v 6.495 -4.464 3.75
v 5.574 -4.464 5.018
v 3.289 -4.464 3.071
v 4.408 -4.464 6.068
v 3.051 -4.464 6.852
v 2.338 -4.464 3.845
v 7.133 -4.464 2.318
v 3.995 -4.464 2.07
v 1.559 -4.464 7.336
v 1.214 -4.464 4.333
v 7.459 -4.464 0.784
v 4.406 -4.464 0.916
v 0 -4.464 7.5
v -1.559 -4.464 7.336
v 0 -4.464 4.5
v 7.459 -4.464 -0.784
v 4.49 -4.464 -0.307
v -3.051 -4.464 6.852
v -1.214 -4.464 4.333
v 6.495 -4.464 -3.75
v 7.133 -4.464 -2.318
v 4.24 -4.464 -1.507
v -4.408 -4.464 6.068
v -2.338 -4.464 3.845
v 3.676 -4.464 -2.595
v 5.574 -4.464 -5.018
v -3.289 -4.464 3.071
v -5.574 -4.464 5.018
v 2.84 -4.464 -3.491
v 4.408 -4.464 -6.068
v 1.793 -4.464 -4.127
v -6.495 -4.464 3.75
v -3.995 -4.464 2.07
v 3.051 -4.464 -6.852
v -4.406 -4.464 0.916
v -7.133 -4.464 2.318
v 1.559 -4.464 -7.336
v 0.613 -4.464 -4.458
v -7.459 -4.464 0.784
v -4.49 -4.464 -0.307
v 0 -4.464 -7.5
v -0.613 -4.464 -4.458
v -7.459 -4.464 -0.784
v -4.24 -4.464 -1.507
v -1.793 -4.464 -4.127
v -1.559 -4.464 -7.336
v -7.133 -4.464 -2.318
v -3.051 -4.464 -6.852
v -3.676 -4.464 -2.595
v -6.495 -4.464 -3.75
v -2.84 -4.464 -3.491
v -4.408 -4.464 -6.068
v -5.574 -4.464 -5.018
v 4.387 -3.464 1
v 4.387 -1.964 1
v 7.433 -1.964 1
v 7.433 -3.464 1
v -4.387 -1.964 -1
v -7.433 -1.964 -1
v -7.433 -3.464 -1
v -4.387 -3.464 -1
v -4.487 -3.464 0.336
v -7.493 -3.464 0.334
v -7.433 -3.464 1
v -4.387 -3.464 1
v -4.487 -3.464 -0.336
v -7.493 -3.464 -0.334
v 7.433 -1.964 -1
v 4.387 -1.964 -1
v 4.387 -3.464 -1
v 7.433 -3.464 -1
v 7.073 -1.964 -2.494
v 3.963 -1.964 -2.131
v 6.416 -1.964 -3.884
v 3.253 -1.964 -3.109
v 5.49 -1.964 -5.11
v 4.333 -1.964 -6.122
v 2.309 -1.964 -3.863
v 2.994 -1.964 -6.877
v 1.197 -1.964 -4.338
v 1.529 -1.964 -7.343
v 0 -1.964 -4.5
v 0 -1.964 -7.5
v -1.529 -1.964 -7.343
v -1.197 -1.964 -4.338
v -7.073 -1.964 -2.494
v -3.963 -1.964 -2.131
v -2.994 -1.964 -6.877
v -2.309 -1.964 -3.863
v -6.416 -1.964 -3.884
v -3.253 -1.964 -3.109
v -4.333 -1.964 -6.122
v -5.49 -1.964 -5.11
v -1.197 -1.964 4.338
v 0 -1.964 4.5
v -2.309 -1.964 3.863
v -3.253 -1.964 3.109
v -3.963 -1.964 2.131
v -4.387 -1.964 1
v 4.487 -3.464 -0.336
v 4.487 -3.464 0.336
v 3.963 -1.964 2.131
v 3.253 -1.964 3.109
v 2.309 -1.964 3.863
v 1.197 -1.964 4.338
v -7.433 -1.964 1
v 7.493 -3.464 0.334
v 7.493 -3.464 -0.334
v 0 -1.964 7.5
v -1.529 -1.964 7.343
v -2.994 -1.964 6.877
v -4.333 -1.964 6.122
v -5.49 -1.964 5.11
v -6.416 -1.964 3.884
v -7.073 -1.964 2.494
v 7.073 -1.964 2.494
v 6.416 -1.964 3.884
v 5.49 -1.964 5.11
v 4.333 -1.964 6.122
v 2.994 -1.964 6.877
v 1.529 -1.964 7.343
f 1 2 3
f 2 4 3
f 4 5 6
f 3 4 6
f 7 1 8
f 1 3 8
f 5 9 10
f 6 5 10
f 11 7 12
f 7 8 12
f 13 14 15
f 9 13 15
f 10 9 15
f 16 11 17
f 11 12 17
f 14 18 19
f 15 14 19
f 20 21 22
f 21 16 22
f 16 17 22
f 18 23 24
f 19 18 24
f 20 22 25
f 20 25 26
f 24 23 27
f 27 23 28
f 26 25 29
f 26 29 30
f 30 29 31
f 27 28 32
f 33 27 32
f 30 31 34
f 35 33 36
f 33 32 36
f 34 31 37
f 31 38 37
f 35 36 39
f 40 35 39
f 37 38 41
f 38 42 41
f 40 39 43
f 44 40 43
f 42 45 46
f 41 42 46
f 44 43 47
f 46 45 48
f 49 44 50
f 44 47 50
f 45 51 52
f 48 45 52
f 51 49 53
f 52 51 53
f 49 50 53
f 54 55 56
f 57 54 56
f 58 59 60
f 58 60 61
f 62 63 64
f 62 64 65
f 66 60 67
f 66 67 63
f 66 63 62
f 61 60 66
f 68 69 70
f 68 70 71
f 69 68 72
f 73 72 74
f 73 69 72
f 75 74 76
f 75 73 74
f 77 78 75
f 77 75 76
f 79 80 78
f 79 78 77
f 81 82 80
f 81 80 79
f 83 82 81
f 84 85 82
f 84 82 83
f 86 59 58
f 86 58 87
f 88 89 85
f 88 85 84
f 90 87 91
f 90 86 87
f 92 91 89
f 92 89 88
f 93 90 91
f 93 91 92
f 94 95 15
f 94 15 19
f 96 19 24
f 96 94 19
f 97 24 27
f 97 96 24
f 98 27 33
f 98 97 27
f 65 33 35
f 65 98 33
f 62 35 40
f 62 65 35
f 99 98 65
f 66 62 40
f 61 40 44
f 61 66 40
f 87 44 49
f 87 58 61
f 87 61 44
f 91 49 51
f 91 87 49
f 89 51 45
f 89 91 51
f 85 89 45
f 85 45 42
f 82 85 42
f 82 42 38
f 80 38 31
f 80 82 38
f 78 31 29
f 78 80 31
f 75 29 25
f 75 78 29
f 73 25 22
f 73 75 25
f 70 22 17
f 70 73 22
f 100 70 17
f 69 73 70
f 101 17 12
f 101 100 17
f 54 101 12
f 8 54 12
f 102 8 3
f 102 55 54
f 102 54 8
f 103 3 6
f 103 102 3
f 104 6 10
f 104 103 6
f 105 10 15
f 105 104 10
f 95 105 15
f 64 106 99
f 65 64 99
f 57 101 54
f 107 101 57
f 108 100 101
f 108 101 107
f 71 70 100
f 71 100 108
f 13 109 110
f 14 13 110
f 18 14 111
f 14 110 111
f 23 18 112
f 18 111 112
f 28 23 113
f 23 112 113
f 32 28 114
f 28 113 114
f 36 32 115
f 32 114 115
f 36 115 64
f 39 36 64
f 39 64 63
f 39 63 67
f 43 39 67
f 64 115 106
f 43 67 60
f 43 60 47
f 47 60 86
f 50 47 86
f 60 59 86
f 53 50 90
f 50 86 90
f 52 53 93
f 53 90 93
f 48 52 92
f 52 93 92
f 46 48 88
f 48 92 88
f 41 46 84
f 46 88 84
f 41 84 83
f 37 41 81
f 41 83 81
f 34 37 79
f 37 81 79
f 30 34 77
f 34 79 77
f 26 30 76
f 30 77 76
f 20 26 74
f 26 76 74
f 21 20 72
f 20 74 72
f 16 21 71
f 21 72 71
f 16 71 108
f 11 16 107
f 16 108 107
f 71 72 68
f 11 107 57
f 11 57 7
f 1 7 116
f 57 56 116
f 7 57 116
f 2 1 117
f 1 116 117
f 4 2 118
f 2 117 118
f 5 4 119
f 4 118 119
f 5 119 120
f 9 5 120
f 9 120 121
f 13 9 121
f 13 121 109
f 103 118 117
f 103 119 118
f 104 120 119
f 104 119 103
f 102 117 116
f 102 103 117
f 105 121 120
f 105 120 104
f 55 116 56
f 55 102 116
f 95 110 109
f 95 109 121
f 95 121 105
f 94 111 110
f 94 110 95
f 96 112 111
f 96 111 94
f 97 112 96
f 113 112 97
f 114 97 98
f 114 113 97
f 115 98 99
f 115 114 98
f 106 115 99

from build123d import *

# Parameters (mm, degrees)
SKETCH_1_W          = 3
SKETCH_1_H          = 2.5
SKETCH_2_W          = 53.705080546
SKETCH_2_H          = 2
CUT_EXTRUDE_1_DEPTH = 1.5


with BuildPart() as part:
    # 草图1 → 旋转1 (revolve)
    with BuildSketch(Plane.XY, mode=Mode.PRIVATE) as revolve_1_sk:
        with Locations((6, -3.214249787)):
            Rectangle(SKETCH_1_W, SKETCH_1_H)
    revolve(revolve_1_sk.sketch.rotate(Axis((0, 56.260842627, 0), (0, -1, 0)), 90), axis=Axis((0, 56.260842627, 0), (0, -1, 0)))  # turned: the seam where the file's is

    # 草图2 → 切除-拉伸1 (cut)
    with BuildSketch(Plane(origin=(0, -1.964249787, 0), x_dir=(1, 0, 0), z_dir=(0, 1, 0))):
        Rectangle(SKETCH_2_W, SKETCH_2_H)
    extrude(amount=-CUT_EXTRUDE_1_DEPTH, mode=Mode.SUBTRACT)


solid = part.part
